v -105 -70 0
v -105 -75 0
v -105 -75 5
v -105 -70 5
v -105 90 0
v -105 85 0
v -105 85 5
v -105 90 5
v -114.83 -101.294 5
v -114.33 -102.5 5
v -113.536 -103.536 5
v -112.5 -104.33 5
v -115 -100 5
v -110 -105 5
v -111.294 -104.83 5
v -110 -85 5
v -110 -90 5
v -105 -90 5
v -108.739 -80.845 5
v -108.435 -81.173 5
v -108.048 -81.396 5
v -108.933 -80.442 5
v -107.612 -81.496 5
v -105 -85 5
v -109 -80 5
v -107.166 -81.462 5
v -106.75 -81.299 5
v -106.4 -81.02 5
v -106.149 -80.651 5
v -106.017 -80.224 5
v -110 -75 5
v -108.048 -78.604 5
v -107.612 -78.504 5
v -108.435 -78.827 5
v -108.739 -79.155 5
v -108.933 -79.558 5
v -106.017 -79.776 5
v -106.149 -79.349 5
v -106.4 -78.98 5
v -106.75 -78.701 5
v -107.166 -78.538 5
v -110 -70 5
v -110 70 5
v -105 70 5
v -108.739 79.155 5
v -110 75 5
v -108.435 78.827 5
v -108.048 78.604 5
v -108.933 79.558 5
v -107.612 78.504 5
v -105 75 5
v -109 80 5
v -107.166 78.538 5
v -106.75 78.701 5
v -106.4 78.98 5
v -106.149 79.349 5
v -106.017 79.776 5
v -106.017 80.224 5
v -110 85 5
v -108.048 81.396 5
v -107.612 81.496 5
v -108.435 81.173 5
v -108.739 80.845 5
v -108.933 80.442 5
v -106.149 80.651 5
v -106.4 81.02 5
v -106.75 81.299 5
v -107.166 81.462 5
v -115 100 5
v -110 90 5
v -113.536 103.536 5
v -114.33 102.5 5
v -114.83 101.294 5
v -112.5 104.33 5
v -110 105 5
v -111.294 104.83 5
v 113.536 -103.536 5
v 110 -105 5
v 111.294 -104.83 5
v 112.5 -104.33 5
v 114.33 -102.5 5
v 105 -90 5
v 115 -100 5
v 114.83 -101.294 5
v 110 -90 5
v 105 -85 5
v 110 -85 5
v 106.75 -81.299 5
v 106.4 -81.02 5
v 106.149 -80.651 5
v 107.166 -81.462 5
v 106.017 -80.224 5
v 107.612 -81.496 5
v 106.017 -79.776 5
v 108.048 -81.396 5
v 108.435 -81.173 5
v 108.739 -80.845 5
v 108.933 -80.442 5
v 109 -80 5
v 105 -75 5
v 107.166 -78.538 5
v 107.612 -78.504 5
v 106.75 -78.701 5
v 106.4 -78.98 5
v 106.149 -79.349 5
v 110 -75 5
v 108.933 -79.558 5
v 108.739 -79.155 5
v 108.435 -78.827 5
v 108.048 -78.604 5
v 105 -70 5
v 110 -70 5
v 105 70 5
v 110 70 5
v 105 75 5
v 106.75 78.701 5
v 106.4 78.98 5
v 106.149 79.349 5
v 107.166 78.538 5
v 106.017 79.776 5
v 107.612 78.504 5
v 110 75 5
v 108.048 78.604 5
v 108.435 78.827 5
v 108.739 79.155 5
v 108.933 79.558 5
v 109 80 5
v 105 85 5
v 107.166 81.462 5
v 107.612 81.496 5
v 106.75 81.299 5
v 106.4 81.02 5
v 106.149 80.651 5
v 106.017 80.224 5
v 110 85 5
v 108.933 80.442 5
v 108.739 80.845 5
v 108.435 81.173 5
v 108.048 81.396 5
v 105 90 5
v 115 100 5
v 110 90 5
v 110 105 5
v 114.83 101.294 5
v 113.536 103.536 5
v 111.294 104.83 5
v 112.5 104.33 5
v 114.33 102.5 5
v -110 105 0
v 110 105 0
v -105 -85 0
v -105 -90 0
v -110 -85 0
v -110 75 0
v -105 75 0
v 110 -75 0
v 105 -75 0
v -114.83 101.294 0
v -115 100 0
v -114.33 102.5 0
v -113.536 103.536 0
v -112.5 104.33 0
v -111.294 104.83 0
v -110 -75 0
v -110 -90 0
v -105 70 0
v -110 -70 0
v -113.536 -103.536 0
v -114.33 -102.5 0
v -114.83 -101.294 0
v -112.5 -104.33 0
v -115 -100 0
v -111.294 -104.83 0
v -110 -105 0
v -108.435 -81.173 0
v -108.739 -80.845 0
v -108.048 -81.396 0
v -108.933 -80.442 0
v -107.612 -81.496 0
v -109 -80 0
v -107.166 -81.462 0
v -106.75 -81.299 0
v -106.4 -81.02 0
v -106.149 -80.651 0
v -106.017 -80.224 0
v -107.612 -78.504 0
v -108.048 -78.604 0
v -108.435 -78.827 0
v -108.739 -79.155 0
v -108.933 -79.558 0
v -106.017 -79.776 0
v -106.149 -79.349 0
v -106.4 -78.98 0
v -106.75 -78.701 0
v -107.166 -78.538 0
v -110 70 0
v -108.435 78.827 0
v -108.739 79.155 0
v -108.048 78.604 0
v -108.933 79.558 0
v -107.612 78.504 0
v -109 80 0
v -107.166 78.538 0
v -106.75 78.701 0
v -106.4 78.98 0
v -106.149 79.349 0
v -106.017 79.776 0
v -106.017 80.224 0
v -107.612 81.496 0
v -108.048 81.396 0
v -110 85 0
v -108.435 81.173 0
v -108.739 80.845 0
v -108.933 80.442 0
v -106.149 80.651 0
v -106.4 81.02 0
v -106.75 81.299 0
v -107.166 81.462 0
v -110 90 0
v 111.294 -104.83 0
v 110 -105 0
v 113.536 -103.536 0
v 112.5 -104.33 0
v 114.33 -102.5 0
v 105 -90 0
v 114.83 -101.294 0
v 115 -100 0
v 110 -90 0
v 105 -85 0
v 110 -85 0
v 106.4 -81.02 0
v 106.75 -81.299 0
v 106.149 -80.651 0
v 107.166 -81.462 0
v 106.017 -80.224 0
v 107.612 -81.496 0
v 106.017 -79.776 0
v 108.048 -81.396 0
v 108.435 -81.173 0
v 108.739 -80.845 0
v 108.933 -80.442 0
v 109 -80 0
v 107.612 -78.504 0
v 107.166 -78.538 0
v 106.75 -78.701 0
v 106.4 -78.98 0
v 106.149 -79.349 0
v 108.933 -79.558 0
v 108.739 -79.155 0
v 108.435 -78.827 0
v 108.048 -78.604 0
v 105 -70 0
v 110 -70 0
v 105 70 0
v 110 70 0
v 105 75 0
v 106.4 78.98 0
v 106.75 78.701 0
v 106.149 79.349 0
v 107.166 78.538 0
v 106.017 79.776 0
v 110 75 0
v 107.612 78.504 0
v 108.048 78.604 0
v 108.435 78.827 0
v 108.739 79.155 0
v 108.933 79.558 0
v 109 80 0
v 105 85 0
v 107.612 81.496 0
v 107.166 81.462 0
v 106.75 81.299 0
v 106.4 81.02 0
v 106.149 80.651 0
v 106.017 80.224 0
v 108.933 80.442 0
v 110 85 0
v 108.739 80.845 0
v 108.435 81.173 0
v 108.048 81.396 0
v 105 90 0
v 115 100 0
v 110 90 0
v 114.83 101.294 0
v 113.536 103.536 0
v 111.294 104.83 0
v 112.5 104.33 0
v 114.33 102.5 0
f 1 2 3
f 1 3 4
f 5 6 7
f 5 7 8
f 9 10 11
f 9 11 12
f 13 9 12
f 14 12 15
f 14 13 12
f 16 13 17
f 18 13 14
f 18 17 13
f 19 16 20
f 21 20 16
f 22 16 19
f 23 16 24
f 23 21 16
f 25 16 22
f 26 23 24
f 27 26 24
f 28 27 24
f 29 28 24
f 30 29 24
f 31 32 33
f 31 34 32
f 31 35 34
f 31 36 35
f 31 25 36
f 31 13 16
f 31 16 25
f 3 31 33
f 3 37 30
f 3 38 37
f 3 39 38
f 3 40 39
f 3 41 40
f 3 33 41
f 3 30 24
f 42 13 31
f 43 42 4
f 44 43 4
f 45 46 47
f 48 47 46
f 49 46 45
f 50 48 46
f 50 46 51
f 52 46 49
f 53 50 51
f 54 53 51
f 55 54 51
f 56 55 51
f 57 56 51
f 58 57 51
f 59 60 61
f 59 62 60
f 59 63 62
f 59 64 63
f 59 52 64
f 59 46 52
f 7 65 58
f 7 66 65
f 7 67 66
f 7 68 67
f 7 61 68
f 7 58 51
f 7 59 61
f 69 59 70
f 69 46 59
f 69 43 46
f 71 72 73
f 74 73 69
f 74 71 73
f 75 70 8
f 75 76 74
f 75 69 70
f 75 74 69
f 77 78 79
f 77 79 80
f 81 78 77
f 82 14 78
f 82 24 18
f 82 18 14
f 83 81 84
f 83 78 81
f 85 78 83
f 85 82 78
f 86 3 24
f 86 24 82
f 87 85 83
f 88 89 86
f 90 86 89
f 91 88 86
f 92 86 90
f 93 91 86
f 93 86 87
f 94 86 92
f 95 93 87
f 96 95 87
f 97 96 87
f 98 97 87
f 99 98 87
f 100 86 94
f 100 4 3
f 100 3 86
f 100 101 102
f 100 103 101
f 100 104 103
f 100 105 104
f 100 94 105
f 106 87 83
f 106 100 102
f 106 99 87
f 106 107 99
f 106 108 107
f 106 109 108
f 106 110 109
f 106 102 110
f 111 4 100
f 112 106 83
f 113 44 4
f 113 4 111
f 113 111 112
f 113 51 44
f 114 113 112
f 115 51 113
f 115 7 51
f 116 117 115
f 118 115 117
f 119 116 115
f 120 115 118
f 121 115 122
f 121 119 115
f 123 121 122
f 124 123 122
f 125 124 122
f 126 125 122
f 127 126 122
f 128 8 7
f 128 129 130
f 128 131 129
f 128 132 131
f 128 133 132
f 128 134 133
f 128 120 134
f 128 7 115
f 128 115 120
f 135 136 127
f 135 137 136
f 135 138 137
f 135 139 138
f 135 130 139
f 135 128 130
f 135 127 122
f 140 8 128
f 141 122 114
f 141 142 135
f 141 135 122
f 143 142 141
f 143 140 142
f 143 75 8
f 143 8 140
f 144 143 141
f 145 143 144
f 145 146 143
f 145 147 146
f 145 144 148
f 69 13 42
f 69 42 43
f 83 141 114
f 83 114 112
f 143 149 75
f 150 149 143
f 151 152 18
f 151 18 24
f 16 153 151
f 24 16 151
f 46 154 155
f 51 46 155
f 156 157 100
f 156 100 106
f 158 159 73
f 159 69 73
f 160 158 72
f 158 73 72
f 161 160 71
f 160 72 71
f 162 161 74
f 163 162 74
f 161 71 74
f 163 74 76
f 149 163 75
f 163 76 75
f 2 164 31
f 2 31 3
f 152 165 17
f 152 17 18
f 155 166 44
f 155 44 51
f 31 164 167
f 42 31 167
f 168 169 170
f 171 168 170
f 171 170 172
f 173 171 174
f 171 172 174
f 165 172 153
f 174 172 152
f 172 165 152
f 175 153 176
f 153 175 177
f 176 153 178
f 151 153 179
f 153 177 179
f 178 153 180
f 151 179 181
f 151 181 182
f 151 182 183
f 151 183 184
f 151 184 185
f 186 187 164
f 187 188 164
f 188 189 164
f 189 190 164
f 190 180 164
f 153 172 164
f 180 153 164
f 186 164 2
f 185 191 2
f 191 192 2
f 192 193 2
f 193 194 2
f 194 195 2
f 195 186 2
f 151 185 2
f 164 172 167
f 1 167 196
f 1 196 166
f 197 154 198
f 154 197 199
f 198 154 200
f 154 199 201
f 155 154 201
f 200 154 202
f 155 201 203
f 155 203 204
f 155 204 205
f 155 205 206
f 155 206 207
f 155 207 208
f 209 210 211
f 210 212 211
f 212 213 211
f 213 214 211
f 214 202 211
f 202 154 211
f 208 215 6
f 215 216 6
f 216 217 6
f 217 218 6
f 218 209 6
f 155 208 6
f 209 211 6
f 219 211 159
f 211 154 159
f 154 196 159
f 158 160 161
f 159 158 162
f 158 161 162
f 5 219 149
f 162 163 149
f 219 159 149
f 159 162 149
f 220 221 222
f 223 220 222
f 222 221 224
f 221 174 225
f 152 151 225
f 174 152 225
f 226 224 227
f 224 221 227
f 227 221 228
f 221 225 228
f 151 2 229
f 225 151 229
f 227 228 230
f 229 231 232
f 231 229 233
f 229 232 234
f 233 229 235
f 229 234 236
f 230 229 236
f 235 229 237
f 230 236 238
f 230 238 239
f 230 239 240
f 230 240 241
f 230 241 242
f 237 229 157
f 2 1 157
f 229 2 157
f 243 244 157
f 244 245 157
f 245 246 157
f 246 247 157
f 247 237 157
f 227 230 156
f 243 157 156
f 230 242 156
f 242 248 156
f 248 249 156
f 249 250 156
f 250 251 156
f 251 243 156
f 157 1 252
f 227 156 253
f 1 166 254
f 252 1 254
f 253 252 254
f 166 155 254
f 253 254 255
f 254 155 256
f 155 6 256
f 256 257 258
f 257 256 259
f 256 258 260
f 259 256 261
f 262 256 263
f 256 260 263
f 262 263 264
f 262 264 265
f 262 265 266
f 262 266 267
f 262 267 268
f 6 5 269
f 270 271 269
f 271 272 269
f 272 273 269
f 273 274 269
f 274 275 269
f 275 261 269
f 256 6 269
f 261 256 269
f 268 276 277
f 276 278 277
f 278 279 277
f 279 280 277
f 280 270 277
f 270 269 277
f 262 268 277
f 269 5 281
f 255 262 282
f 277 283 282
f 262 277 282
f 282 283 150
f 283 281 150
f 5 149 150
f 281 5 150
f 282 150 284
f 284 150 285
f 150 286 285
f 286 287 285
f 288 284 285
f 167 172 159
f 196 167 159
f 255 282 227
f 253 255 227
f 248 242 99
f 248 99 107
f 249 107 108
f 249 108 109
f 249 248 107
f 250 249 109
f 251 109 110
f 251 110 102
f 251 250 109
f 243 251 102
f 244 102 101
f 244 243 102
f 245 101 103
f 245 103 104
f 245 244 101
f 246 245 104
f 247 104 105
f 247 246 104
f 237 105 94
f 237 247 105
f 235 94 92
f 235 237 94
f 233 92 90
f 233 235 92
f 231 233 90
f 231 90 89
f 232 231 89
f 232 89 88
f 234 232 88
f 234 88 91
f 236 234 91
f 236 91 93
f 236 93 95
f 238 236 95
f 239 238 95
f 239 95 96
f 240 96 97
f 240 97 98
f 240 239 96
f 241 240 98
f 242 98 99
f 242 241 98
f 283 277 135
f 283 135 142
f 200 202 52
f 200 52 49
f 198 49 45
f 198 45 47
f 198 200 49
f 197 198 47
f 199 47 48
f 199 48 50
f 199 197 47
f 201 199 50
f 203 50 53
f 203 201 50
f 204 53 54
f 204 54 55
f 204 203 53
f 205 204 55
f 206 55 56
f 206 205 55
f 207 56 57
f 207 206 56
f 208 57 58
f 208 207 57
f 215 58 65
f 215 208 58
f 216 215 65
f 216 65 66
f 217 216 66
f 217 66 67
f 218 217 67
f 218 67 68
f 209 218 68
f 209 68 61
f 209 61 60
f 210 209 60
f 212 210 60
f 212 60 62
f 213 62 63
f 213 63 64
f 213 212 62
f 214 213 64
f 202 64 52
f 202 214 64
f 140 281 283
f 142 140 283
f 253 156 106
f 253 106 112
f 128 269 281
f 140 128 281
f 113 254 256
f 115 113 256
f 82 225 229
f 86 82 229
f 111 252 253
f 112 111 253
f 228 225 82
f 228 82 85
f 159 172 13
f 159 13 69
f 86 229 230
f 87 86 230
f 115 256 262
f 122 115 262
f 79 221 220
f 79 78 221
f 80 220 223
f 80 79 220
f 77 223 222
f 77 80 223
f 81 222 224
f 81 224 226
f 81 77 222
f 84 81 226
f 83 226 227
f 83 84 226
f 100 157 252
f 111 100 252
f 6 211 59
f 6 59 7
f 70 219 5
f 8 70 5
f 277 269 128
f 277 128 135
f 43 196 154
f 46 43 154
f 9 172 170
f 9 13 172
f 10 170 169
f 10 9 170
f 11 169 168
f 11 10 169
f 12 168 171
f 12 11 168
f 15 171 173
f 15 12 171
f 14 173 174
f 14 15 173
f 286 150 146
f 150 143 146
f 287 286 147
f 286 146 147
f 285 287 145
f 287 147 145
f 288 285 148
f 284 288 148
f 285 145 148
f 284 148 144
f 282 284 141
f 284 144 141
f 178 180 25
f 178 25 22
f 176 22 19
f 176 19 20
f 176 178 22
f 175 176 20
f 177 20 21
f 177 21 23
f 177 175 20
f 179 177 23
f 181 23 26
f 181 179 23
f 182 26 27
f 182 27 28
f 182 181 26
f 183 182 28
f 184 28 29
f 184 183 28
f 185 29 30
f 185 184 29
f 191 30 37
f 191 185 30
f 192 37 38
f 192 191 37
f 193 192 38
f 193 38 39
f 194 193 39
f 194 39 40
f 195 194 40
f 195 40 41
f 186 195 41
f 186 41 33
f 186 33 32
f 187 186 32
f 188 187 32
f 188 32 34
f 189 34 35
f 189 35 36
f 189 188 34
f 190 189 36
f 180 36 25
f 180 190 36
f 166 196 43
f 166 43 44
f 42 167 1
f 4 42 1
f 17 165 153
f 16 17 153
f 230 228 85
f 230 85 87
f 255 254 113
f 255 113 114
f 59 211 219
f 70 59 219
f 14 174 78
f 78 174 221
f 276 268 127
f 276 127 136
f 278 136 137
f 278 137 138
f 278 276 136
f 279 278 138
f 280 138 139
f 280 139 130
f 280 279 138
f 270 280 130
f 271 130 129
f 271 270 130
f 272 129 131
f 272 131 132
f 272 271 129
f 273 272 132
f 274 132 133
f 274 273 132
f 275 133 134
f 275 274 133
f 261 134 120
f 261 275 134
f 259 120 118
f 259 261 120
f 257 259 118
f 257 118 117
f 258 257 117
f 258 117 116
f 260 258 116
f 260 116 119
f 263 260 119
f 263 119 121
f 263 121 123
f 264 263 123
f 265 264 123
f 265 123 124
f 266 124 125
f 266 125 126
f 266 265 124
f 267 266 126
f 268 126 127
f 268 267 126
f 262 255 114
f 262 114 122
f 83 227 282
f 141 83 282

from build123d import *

# Parameters (mm, degrees)
ESQUISSE1_W        = 230
ESQUISSE1_H        = 210
ESQUISSE1_R        = 1.5
ESQUISSE1_W_2      = 5
ESQUISSE1_H_2      = 5
BOSS_EXTRU_1_DEPTH = 5
CONG_1_R           = 5


with BuildPart() as part:
    # Esquisse1 → Boss.-Extru.1 (new body)
    with BuildSketch(Plane.XY):
        Rectangle(ESQUISSE1_W, ESQUISSE1_H)
        with Locations((107.5, 80)):
            Circle(ESQUISSE1_R, mode=Mode.SUBTRACT)
        with Locations((107.5, -80)):
            Circle(ESQUISSE1_R, mode=Mode.SUBTRACT)
        with Locations(Location((-107.5, -80, 0), (0, 0, 180))):
            Circle(ESQUISSE1_R, mode=Mode.SUBTRACT)
        with Locations(Location((-107.5, 80, 0), (0, 0, 180))):
            Circle(ESQUISSE1_R, mode=Mode.SUBTRACT)
        with Locations((107.5, 72.5)):
            Rectangle(ESQUISSE1_W_2, ESQUISSE1_H_2, mode=Mode.SUBTRACT)
        with Locations((107.5, 87.5)):
            Rectangle(ESQUISSE1_W_2, ESQUISSE1_H_2, mode=Mode.SUBTRACT)
        with Locations((107.5, -87.5)):
            Rectangle(ESQUISSE1_W_2, ESQUISSE1_H_2, mode=Mode.SUBTRACT)
        with Locations((107.5, -72.5)):
            Rectangle(ESQUISSE1_W_2, ESQUISSE1_H_2, mode=Mode.SUBTRACT)
        with Locations((-107.5, -87.5)):
            Rectangle(ESQUISSE1_W_2, ESQUISSE1_H_2, mode=Mode.SUBTRACT)
        with Locations((-107.5, -72.5)):
            Rectangle(ESQUISSE1_W_2, ESQUISSE1_H_2, mode=Mode.SUBTRACT)
        with Locations((-107.5, 72.5)):
            Rectangle(ESQUISSE1_W_2, ESQUISSE1_H_2, mode=Mode.SUBTRACT)
        with Locations((-107.5, 87.5)):
            Rectangle(ESQUISSE1_W_2, ESQUISSE1_H_2, mode=Mode.SUBTRACT)
    extrude(amount=BOSS_EXTRU_1_DEPTH)

    # Congé1
    cong_1_edges = [part.edges().sort_by_distance(p)[0] for p in [
        (-115, 105, 2.5),
        (115, 105, 2.5),
        (115, -105, 2.5),
        (-115, -105, 2.5),
    ]]
    fillet(cong_1_edges, radius=CONG_1_R)


solid = part.part
